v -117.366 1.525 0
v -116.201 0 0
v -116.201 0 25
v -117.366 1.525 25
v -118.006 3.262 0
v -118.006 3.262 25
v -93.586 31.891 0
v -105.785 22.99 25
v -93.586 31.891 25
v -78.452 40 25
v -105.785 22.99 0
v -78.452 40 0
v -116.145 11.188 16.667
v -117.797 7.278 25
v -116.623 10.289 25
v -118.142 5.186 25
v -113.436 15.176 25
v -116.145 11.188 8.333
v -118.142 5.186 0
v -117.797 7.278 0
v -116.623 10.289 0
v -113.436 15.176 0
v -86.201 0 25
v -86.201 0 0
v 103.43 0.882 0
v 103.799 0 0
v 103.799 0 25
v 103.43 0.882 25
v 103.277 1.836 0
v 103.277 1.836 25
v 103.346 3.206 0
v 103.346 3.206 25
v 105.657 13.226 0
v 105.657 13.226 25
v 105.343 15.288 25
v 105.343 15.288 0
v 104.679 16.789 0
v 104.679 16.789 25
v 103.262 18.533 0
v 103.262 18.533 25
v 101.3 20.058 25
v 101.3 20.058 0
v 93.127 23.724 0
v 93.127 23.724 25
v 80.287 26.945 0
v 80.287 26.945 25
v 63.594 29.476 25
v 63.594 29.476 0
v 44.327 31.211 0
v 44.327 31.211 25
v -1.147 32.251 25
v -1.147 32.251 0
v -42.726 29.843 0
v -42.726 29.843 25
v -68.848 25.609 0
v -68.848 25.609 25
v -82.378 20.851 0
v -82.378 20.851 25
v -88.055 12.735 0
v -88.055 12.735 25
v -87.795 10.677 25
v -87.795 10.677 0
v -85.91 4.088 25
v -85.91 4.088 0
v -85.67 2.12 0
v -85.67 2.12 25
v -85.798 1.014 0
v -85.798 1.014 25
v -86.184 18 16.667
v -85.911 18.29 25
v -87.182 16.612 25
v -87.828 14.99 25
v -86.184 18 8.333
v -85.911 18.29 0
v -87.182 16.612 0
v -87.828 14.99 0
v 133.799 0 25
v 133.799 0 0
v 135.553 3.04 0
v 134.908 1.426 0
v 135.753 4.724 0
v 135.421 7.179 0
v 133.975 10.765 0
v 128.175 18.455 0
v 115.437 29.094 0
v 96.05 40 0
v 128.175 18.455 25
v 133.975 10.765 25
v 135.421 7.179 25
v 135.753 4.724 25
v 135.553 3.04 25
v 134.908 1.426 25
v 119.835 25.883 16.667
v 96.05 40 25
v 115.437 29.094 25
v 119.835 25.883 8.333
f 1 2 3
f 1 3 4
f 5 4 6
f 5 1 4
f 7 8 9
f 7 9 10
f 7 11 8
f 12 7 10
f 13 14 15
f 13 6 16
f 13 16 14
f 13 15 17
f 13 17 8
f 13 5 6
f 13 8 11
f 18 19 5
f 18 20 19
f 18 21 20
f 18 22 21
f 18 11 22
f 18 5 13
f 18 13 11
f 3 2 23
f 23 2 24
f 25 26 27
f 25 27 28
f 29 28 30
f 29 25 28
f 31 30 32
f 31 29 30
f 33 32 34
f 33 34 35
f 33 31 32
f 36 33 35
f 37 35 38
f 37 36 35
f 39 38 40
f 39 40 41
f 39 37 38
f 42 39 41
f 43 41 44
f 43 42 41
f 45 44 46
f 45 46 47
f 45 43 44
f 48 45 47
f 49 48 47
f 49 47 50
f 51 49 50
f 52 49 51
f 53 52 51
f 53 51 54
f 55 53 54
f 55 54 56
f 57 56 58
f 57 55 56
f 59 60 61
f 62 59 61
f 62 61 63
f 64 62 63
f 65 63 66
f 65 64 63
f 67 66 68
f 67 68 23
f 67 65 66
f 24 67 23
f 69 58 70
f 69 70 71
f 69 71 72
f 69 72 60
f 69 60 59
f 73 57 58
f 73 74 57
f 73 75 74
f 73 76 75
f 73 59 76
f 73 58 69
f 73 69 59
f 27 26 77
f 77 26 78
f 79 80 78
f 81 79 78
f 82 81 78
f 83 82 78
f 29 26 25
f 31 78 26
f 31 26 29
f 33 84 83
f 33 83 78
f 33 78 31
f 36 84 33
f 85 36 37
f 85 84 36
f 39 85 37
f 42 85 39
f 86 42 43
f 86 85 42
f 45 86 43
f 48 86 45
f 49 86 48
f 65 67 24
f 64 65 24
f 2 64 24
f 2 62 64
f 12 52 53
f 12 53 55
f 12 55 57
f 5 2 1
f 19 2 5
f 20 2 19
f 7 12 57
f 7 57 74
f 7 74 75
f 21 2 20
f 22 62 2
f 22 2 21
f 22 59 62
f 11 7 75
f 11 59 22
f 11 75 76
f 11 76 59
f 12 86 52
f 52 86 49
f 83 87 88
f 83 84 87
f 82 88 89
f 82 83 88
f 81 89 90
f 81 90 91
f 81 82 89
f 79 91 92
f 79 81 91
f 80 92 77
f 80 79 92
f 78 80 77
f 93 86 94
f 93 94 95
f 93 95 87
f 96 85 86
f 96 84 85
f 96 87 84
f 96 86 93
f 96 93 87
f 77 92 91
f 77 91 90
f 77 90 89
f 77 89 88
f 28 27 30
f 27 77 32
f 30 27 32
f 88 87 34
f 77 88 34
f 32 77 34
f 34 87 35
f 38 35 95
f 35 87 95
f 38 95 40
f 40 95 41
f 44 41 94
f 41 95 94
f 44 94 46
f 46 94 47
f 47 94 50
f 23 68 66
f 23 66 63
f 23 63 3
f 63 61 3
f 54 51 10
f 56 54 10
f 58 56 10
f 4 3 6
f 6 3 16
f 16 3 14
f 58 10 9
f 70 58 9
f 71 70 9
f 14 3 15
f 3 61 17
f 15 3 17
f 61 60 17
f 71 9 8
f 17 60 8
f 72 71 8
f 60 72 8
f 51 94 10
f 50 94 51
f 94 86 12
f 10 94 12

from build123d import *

# Parameters (mm, degrees)
F1_DEPTH = 25


with BuildPart() as f1:
    # F0 (on Top) → F1 (new body)
    with BuildSketch(Plane.XY):
        with BuildLine():
            add(Edge.make_bspline(
                [(-116.2008633957, 0), (-124.3957559353, 8.071296767), (-105.8506085877, 27.534724907), (-78.4516912193, 40)],
                knots=[0, 0, 0, 0, 0.1210513861, 0.1210513861, 0.1210513861, 0.1210513861], degree=3))
            Line((-116.2008633957, 0), (-86.2008633957, 0))
            add(Edge.make_bspline(
                [(103.7991366043, 0), (101.235325492, 4.4215579911), (134.5147878784, 37.1139422067), (-116.9165146698, 37.1139422067), (-83.6370522834, 4.4215579911), (-86.2008633957, 0)],
                knots=[0.5471247269, 0.5471247269, 0.5471247269, 0.5471247269, 0.6163755226, 0.8413468307, 0.9105976264, 0.9105976264, 0.9105976264, 0.9105976264], degree=3))
            Line((103.7991366043, 0), (133.7991366043, 0))
            add(Edge.make_bspline(
                [(96.0499644279, 40), (123.4488817963, 27.534724907), (141.9940291439, 8.071296767), (133.7991366043, 0)],
                knots=[0.3366709672, 0.3366709672, 0.3366709672, 0.3366709672, 0.4577223533, 0.4577223533, 0.4577223533, 0.4577223533], degree=3))
            Line((96.0499644279, 40), (-78.4516912193, 40))
        make_face()
    extrude(amount=F1_DEPTH)


solid = f1.part
